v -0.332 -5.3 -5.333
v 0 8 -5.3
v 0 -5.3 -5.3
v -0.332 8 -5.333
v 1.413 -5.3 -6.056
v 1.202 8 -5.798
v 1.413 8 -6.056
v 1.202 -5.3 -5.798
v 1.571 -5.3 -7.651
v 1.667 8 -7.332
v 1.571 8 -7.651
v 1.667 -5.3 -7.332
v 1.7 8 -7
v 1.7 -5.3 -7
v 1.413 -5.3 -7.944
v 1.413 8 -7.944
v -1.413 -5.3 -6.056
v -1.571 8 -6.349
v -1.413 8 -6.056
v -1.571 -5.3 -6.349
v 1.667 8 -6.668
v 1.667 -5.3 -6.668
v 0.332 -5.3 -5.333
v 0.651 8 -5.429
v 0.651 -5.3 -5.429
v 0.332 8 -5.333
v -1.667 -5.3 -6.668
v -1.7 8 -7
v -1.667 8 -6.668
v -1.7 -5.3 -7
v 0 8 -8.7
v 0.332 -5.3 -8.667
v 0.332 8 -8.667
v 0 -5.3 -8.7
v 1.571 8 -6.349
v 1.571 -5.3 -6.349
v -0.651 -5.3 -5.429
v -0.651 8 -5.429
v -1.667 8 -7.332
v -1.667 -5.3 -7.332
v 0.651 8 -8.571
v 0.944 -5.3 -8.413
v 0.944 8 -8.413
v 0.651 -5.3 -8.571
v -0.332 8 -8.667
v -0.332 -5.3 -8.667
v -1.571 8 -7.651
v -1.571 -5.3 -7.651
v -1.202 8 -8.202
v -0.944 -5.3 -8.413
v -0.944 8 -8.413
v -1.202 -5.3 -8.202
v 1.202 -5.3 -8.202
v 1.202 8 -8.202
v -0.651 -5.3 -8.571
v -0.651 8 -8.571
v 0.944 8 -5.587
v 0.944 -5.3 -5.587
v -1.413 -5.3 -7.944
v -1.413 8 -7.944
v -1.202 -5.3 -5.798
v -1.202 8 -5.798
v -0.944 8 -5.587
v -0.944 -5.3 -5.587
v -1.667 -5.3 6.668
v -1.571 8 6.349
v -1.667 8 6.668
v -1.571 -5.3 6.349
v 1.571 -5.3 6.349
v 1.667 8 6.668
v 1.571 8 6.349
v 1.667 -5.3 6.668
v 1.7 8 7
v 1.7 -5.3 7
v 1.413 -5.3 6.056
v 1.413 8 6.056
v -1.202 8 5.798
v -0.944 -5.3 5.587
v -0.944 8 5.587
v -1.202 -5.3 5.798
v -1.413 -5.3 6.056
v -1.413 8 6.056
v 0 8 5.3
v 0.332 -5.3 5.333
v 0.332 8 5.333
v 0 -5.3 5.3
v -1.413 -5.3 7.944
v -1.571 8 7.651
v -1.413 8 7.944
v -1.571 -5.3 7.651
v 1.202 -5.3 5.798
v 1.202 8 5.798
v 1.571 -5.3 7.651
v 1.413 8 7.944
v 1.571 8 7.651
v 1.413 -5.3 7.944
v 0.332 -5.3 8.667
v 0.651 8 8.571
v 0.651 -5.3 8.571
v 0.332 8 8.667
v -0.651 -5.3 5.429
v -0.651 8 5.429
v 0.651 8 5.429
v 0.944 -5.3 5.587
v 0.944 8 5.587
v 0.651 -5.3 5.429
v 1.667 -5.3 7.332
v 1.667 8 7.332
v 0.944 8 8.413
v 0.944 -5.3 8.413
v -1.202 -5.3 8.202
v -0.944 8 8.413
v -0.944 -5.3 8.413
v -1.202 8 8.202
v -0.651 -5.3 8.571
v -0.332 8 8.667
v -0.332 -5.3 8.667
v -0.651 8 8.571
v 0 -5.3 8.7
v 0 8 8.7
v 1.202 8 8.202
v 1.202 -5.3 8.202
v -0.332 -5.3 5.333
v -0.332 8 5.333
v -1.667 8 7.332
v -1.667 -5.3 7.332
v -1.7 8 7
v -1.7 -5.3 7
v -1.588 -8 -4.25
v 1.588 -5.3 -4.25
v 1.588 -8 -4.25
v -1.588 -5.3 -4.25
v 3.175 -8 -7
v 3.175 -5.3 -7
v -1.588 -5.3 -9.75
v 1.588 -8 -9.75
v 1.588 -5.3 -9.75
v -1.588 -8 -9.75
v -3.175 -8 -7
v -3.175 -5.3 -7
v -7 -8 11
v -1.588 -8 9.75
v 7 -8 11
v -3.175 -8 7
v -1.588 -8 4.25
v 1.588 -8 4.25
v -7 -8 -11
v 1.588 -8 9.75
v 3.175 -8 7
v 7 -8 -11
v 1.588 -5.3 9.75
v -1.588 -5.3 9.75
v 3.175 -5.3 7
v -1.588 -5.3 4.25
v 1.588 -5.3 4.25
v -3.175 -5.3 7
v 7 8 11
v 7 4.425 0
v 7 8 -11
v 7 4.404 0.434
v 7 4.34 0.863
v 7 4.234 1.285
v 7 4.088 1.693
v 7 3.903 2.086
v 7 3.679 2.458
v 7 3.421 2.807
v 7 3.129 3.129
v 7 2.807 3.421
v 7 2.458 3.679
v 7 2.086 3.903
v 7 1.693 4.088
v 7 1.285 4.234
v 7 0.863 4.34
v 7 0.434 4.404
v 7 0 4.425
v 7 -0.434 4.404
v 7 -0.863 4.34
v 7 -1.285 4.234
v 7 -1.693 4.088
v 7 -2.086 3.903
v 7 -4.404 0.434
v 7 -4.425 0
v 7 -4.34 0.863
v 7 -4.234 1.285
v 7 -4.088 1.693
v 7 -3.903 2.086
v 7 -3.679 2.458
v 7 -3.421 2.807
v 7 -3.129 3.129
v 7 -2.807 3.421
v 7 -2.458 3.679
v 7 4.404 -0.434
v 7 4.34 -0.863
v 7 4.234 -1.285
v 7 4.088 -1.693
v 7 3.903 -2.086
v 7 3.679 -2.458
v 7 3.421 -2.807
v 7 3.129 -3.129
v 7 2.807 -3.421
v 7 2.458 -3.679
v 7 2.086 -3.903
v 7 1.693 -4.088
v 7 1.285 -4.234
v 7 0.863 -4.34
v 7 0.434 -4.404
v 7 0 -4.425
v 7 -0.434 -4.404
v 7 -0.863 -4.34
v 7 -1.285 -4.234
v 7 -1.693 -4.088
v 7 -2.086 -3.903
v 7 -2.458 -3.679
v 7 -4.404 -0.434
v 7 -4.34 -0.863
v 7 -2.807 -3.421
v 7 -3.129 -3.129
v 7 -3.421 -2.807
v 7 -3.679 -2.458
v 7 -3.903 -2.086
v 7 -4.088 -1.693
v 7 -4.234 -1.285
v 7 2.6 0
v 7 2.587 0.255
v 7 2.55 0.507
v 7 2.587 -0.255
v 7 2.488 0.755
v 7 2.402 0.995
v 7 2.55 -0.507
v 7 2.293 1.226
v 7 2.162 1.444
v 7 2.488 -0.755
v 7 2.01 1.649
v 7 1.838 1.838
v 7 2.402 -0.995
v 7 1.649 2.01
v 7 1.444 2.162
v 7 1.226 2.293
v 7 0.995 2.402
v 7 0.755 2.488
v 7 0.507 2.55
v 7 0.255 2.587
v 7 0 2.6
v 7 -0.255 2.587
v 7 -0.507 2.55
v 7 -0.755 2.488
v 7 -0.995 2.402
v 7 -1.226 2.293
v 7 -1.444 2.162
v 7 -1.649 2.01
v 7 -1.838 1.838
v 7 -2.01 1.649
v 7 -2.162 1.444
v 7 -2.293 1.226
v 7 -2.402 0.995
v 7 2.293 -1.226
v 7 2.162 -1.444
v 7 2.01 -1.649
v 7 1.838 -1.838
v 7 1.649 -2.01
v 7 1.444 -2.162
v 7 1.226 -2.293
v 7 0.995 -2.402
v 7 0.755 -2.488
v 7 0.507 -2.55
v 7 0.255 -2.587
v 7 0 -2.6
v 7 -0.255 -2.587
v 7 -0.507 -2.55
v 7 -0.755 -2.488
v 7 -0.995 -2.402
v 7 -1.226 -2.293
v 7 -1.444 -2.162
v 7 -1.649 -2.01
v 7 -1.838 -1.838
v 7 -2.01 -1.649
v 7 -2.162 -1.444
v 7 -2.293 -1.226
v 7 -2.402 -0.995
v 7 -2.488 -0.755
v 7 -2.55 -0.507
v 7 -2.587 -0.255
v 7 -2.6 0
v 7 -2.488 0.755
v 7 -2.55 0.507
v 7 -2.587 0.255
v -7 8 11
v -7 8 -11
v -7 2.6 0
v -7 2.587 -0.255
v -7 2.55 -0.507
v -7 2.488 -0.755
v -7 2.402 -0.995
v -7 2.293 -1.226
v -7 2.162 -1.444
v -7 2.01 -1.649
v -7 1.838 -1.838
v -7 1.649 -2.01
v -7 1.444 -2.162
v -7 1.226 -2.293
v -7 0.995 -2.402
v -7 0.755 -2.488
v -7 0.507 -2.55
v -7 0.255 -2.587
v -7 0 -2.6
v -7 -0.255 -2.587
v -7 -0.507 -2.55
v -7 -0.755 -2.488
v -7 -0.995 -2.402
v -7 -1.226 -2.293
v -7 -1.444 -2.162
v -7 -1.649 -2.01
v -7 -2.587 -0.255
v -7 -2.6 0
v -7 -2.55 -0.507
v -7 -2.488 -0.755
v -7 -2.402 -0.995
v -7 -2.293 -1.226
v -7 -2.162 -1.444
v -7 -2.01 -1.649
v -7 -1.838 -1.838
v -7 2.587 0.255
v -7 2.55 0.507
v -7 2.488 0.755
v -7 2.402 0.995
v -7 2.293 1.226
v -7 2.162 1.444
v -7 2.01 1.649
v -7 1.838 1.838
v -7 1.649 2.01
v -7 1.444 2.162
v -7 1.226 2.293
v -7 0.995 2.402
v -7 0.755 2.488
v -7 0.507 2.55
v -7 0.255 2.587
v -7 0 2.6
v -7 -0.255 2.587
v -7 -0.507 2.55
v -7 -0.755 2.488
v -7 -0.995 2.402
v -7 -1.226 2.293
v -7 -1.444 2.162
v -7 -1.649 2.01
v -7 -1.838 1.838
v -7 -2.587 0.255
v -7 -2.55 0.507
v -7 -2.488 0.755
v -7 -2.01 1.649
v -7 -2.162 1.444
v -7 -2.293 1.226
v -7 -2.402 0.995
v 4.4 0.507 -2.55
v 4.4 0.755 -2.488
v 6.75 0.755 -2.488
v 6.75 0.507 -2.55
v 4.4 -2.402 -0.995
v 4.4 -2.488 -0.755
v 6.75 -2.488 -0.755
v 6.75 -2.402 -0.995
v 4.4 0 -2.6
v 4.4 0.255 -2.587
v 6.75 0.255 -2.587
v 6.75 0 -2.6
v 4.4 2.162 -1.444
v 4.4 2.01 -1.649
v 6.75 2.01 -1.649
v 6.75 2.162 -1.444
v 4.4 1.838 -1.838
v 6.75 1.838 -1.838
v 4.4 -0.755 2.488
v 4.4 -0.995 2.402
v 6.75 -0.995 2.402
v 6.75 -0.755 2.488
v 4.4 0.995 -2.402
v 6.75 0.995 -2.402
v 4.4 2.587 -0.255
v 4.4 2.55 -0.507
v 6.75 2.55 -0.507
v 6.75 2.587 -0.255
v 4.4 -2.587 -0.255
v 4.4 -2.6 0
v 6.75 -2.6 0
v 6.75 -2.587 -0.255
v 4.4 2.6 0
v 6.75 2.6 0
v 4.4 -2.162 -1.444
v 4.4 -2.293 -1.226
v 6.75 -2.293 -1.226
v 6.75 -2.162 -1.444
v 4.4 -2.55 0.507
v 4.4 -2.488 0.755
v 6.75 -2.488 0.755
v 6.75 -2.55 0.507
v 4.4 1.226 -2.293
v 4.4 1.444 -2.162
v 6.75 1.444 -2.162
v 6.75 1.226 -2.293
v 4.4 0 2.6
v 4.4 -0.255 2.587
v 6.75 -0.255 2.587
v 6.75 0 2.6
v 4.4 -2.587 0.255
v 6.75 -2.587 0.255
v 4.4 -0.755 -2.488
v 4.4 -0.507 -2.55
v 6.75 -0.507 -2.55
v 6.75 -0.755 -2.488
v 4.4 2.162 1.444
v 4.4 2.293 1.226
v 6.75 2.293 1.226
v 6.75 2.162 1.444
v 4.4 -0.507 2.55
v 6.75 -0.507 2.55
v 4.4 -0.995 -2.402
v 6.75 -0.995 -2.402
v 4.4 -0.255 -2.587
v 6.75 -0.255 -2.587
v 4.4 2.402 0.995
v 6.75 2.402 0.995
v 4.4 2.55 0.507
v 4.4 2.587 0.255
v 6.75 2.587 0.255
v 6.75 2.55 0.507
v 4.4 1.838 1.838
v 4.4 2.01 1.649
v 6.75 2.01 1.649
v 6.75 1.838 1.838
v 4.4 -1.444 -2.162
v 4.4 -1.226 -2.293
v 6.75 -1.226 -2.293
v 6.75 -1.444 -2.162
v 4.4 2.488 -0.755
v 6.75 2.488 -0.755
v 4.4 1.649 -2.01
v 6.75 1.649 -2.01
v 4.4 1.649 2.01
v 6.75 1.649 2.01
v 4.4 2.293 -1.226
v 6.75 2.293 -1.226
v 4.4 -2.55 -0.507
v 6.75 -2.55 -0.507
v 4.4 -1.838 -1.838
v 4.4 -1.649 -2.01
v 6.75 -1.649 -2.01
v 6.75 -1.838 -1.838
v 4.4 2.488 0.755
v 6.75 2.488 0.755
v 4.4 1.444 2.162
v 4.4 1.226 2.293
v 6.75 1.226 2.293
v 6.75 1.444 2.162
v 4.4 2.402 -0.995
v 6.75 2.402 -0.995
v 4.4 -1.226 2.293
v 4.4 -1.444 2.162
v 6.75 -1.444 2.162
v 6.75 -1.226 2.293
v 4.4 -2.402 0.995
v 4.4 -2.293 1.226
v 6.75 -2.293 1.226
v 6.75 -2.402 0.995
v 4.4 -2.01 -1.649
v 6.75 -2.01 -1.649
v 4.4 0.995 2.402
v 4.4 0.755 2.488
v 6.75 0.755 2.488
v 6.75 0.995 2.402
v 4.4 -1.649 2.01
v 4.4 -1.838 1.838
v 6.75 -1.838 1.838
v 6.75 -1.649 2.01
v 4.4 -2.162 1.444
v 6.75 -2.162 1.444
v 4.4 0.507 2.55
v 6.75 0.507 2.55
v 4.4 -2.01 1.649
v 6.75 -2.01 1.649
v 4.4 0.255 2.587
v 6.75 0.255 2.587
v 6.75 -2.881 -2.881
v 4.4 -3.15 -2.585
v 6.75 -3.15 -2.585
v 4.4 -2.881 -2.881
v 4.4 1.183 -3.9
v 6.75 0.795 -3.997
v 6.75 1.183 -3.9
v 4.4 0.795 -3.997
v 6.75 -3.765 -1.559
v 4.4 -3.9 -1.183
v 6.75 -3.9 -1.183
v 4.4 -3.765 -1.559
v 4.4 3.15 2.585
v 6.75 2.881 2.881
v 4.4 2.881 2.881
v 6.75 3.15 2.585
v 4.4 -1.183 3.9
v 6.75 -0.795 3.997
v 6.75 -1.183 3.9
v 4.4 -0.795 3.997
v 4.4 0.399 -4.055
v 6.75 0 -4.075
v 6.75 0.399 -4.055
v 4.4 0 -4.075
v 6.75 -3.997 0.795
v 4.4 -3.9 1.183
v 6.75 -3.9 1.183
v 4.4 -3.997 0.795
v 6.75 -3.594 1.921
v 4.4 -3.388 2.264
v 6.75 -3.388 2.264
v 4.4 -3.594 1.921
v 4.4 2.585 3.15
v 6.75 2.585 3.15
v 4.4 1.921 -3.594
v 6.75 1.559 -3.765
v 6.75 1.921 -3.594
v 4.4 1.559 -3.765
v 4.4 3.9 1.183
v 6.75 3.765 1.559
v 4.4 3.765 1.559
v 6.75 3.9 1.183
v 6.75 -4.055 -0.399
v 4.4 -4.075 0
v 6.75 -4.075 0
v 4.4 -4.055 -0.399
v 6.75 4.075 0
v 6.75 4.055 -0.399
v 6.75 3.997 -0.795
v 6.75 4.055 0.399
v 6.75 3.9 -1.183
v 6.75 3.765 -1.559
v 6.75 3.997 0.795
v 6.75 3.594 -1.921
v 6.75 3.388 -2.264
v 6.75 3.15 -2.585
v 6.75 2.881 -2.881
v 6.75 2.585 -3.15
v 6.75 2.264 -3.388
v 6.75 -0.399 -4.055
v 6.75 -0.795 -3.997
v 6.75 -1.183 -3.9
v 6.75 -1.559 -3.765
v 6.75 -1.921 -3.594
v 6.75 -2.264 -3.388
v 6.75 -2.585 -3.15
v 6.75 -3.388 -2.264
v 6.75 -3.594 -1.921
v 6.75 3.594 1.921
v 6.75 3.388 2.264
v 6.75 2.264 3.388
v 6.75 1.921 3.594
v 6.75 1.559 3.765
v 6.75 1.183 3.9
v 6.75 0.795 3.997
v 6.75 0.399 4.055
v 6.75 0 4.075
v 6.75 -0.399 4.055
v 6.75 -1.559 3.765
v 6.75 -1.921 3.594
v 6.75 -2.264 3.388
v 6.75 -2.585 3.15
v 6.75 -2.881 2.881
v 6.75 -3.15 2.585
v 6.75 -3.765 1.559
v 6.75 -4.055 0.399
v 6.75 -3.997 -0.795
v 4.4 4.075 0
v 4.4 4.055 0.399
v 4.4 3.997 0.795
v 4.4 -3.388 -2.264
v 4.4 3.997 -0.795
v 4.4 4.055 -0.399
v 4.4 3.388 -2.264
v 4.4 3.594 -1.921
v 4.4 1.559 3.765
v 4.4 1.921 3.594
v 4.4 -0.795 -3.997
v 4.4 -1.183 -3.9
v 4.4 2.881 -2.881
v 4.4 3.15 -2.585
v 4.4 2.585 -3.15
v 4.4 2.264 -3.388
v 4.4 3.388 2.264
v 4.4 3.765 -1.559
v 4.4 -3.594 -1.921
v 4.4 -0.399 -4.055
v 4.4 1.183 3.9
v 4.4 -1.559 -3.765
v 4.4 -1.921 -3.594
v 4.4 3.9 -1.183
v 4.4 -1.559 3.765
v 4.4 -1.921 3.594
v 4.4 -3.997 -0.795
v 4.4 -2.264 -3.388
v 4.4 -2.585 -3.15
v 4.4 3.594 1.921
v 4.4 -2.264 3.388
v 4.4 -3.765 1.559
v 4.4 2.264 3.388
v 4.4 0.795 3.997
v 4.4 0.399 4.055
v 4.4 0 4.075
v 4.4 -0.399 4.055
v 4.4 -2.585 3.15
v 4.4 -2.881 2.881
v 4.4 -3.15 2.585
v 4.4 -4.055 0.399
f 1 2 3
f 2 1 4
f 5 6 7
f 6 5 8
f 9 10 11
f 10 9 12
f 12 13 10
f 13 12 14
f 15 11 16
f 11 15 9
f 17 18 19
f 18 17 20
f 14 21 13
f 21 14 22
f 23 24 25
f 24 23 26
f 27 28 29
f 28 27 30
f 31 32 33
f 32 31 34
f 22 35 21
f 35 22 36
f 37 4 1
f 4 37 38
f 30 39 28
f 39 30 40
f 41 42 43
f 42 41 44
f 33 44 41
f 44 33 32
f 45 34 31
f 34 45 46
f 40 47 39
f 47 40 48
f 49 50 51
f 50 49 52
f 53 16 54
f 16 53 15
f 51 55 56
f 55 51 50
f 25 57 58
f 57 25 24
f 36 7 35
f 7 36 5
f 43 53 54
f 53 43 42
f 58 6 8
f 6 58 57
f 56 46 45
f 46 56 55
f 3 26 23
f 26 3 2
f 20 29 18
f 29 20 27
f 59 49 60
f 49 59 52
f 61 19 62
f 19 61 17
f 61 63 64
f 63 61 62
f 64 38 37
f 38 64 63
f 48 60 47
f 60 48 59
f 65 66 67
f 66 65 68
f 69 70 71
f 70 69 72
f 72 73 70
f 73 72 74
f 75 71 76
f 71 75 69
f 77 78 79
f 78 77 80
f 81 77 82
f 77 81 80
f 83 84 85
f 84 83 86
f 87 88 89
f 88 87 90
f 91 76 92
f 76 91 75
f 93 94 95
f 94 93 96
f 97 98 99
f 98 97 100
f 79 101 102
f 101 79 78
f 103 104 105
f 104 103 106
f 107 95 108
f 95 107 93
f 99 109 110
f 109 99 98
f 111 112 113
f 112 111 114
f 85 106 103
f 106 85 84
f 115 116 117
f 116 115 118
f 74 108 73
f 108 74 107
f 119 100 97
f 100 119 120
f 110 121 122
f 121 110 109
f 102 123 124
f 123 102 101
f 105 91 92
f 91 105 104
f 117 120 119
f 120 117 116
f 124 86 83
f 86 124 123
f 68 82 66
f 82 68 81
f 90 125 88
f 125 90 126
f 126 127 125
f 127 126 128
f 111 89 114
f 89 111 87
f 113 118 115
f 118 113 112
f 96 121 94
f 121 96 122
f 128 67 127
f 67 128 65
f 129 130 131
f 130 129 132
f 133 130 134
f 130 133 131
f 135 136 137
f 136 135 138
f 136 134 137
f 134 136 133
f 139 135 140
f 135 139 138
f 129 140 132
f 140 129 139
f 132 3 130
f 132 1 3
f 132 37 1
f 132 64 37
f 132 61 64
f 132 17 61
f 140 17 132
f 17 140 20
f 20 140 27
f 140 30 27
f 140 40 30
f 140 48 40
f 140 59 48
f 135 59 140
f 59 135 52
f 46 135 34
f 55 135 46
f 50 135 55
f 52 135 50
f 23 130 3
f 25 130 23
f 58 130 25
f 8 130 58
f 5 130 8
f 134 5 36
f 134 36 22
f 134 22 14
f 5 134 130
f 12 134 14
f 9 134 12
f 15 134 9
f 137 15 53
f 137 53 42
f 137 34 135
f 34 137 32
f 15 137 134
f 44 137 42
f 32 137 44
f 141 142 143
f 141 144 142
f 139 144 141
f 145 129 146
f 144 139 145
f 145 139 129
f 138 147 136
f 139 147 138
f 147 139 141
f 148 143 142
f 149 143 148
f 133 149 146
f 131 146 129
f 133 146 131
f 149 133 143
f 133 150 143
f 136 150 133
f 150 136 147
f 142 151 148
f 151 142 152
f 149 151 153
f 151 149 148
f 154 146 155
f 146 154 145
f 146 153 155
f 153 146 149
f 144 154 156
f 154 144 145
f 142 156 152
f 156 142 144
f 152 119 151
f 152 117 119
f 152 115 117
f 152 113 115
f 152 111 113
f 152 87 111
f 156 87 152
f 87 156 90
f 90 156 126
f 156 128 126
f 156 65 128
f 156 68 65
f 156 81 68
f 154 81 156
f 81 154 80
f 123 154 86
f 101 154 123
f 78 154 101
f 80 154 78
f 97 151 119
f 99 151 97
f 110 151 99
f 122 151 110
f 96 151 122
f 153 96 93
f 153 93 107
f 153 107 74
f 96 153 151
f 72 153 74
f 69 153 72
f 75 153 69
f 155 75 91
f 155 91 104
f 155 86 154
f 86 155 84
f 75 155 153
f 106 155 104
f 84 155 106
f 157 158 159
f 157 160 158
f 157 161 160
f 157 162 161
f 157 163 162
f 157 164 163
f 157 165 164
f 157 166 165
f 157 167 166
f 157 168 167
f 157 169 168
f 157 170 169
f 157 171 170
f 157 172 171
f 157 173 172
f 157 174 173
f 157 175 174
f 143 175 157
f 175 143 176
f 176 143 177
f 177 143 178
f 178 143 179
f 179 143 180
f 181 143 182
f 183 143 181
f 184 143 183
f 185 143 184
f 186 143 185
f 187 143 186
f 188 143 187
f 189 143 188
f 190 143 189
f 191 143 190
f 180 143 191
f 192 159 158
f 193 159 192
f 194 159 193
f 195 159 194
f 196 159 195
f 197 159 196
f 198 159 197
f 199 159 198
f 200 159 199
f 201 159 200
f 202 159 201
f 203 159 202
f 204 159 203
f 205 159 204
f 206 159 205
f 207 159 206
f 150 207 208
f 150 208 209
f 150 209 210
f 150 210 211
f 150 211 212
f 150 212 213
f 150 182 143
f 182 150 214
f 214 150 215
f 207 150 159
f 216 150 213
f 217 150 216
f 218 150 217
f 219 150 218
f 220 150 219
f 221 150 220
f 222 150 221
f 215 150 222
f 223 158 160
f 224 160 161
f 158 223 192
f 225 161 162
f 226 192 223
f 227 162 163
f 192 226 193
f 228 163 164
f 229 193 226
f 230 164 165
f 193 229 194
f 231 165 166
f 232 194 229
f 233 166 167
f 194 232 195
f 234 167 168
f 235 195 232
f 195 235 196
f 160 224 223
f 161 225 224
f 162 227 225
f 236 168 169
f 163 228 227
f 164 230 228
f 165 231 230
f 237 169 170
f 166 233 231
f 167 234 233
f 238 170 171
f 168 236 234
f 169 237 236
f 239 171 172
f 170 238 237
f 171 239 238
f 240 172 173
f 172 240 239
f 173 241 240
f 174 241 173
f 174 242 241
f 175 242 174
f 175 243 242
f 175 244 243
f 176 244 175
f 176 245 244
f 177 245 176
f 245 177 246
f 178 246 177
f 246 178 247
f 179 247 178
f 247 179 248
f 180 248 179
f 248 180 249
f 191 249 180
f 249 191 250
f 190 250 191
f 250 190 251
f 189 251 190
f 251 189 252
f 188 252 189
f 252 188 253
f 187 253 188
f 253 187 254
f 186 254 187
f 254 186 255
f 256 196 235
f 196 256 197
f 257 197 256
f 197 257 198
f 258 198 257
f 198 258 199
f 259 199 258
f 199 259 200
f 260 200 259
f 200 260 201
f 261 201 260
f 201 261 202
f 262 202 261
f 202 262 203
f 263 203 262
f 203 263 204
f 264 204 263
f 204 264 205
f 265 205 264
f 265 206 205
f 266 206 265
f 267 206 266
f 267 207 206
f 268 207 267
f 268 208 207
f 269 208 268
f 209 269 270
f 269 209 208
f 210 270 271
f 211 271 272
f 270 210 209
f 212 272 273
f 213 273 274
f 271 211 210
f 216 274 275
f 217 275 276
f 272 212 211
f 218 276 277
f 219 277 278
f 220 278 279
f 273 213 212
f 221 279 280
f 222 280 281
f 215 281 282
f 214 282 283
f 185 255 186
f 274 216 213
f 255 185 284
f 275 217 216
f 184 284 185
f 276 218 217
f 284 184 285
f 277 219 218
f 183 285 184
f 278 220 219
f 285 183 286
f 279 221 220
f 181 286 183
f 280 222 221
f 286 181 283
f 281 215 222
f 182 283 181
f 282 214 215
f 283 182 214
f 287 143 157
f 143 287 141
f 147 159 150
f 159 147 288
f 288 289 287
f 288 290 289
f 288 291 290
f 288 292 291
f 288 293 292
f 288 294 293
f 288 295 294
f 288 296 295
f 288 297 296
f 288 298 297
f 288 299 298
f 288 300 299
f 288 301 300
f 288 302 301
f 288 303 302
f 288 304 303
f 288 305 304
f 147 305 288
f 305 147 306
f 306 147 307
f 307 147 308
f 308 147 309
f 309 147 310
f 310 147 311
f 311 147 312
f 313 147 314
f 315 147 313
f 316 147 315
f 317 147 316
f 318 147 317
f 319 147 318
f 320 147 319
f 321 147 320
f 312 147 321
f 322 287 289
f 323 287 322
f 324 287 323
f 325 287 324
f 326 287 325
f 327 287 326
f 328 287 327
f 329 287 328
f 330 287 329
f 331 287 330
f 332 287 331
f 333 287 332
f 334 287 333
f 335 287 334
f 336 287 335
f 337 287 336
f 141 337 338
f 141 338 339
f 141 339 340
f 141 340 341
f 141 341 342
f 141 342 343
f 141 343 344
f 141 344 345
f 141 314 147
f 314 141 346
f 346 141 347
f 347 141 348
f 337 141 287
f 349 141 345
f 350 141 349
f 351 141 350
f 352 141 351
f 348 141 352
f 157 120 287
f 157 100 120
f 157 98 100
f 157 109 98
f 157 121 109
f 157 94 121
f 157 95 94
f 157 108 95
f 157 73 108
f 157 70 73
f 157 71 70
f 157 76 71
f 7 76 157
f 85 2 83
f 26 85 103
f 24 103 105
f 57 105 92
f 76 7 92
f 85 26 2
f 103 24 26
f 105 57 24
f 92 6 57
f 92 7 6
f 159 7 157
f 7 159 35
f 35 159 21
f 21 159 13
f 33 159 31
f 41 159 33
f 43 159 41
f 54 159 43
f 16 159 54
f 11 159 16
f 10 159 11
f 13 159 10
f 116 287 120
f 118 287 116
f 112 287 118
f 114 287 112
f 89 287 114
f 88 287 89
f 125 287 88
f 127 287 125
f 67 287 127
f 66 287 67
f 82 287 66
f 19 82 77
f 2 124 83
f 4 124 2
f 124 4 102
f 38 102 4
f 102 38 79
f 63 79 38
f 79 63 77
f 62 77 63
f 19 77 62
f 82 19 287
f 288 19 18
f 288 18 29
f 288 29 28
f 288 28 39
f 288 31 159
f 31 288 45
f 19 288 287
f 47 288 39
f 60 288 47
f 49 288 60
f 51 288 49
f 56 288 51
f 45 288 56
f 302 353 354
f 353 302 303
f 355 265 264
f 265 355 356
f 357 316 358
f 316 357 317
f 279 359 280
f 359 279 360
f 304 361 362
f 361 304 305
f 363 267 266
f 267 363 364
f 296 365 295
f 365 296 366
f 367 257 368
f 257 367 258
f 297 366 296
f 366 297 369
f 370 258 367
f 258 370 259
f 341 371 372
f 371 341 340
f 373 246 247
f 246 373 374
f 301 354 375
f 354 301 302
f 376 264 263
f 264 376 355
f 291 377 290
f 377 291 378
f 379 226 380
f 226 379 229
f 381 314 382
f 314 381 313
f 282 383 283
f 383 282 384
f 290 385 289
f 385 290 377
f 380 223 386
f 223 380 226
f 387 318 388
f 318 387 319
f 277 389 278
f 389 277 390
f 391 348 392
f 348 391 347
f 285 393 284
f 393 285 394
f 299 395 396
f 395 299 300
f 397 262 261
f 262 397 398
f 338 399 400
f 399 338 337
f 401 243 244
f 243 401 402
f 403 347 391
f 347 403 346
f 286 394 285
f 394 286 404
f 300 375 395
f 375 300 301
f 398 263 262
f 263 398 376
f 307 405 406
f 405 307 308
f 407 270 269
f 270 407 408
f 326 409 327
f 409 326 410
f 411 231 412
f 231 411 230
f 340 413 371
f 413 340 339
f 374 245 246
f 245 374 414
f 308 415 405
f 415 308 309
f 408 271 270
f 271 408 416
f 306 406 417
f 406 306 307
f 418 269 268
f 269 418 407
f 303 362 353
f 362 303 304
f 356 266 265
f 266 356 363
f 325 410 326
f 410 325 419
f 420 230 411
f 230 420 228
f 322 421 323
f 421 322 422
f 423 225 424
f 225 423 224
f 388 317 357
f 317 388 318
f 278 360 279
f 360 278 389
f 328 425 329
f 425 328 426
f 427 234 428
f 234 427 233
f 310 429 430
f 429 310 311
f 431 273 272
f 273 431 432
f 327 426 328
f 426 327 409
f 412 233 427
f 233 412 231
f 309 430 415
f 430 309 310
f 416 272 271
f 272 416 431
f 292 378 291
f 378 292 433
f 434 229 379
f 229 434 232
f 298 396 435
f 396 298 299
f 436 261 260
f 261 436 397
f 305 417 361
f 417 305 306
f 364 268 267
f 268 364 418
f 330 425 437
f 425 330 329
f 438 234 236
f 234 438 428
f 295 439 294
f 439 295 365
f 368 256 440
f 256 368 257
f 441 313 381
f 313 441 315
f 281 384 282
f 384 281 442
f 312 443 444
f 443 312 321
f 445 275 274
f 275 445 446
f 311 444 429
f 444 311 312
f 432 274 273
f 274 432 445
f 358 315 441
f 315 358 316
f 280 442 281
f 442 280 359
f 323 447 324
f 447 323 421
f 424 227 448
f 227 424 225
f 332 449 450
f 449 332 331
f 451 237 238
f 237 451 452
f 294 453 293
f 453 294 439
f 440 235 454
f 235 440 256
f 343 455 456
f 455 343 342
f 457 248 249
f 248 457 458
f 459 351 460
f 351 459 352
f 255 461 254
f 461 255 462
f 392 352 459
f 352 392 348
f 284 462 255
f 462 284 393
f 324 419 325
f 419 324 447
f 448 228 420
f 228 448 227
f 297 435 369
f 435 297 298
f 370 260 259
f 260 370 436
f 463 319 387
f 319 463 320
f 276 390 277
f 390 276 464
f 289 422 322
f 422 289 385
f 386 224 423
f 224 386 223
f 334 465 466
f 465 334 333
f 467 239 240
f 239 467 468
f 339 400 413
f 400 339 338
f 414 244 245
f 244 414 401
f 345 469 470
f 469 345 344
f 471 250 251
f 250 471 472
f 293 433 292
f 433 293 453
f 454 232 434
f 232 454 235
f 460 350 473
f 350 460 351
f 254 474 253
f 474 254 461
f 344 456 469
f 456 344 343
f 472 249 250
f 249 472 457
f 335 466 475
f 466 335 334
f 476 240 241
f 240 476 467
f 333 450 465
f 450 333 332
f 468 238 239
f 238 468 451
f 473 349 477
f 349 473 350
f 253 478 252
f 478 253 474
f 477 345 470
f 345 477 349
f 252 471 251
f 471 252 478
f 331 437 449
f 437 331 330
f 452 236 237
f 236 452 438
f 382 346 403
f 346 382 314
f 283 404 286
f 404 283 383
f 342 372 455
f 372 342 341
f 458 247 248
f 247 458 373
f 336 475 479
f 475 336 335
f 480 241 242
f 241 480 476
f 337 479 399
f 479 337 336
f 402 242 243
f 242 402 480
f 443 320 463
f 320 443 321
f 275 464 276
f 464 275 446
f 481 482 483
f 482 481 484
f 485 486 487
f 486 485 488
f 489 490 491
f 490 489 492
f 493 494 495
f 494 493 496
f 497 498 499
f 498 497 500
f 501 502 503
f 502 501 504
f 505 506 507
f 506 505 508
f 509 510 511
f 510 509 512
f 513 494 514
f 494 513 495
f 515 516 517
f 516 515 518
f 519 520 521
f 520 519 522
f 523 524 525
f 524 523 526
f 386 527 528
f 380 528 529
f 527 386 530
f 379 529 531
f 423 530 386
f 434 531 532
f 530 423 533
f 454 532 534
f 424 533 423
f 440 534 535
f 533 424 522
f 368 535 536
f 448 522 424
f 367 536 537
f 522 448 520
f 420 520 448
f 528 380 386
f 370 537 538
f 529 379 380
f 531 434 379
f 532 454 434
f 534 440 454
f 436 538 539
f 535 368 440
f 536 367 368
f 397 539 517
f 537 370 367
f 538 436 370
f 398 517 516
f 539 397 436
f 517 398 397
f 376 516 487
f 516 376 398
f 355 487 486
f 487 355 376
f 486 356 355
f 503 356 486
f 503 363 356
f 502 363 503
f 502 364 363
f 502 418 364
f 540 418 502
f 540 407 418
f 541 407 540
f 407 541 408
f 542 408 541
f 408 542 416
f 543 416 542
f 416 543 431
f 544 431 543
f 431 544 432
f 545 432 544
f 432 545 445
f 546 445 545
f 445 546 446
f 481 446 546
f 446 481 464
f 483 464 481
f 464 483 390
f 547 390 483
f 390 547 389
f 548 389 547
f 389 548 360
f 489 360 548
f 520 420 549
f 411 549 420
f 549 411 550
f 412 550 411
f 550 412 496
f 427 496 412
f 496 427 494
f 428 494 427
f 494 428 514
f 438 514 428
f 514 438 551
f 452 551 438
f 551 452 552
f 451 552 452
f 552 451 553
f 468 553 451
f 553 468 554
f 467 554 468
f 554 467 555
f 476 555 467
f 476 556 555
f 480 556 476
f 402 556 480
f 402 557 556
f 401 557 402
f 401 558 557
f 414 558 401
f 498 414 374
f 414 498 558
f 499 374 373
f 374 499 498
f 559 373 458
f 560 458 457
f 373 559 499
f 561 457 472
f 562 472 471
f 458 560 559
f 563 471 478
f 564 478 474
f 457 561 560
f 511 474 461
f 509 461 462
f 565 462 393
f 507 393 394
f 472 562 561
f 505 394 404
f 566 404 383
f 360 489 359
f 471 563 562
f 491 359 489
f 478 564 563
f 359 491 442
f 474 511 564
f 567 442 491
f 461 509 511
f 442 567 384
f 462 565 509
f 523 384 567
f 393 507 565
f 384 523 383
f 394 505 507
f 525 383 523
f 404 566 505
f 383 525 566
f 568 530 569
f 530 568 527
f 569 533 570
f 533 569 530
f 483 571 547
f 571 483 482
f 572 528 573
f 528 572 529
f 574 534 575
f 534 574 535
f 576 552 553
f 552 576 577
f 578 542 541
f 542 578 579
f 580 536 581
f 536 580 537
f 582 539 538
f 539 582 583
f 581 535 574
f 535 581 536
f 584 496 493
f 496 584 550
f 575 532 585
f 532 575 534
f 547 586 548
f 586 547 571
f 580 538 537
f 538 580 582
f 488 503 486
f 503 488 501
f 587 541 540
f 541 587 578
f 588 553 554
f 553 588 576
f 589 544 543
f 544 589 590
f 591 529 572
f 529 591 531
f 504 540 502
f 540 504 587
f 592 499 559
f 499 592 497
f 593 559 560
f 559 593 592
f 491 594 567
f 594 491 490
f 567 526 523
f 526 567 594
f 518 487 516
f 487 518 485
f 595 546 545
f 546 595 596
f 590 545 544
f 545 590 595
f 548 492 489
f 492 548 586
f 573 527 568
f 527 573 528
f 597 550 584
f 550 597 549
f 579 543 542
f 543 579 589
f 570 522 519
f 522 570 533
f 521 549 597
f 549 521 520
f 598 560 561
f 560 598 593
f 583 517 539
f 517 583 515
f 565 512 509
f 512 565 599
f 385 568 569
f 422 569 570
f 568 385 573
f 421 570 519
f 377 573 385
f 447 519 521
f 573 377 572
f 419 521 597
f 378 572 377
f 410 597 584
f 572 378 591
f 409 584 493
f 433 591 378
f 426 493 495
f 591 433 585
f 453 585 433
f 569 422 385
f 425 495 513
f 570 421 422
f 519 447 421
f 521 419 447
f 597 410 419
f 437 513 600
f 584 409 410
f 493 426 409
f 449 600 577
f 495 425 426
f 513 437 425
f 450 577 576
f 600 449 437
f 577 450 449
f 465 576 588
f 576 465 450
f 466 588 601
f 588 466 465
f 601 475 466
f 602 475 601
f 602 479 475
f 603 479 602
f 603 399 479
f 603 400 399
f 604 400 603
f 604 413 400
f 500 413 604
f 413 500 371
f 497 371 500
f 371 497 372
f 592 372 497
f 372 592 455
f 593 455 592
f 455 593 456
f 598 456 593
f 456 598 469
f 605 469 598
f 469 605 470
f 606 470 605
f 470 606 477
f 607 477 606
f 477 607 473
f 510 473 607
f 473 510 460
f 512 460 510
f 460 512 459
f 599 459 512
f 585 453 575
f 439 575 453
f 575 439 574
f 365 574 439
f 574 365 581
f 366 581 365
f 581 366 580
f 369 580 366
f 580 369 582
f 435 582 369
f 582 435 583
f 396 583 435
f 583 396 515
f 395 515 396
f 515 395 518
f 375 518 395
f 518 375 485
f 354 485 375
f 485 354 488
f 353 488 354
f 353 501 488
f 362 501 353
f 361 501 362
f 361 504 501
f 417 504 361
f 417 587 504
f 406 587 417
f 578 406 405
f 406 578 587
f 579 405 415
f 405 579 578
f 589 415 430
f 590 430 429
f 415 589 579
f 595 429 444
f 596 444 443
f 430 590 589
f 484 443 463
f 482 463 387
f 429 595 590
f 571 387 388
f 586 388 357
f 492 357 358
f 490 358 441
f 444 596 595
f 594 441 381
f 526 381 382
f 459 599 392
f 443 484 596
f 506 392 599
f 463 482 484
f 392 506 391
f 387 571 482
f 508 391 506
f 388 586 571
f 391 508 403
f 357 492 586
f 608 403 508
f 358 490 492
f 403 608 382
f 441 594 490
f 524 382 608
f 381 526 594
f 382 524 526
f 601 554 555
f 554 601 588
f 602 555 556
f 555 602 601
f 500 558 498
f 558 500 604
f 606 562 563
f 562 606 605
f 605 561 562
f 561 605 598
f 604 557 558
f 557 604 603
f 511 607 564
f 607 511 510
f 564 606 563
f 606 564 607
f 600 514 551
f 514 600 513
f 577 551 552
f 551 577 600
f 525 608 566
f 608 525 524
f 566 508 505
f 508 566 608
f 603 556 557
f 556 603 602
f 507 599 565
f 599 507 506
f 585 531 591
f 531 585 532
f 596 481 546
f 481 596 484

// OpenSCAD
// bearing_block.scad
// Single-bearing support block for the 5mm driven shaft.
// Two blocks are needed per shaft, spaced ~38-50mm apart (set from frame layout).
// Each block holds one MR85ZZ bearing (5mm ID, 8mm OD, 2.5mm wide).
//
// Coordinate system (assembled):
//   X = shaft axis direction
//   Y = lateral (left-right, perpendicular to shaft)
//   Z = vertical (up)
//   Shaft center is at the block center (origin when centered).
//
// Bearing pocket opens at the +X face (outer shaft end).
// M3 mounting holes run through the Y faces for side-wall frame mounting.
// Two M3 bolts pass through the block from the outer frame wall,
// captured by M3 nuts on the inner face.
//
// Print orientation: shaft axis vertical (X axis = print Z) gives the
// best circularity for the bearing pocket. Alternatively print flat and
// verify pocket fit with coupon before committing.
//
// Hardware needed per block:
//   1x MR85ZZ bearing
//   2x M3 bolt + nut

include <rollers_params.scad>

module bearing_block(params = default_params()) {
  validate(params);

  bx = pget(params, "provisional_bearing_block_x_mm");   // shaft axis depth
  by = pget(params, "provisional_bearing_block_y_mm");   // lateral width
  bz = pget(params, "provisional_bearing_block_z_mm");   // vertical height

  pocket_d       = pget(params, "provisional_bearing_pocket_d");
  pocket_depth   = pget(params, "provisional_bearing_pocket_depth");
  pocket_chamfer = pget(params, "provisional_bearing_lead_chamfer");
  shaft_d        = pget(params, "provisional_axle_clear_d");
  m3_z_offset    = pget(params, "provisional_bearing_block_m3_z_offset");
  m3_d           = 3.4;
  m3_nut_flat    = 5.5;
  m3_nut_depth   = 2.6;

  straight_depth = pocket_depth - pocket_chamfer;

  // Block centered at origin in all axes
  difference() {
    translate([-bx/2, -by/2, -bz/2])
      cube([bx, by, bz]);

    // Shaft bore through full X depth
    rotate([0, 90, 0])
      translate([0, 0, -bx/2 - 0.1])
        cylinder(h = bx + 0.2, d = shaft_d, $fn = 64);

    // Bearing pocket at +X face: lead chamfer then straight bore
    // Chamfer: widens toward the +X face
    translate([bx/2, 0, 0])
      rotate([0, 90, 0])
        cylinder(h = pocket_chamfer + 0.1,
                 d1 = pocket_d + 2*pocket_chamfer,
                 d2 = pocket_d,
                 $fn = 64);
    // Straight pocket (inward from chamfer end)
    translate([bx/2 - pocket_depth, 0, 0])
      rotate([0, 90, 0])
        cylinder(h = straight_depth + 0.1, d = pocket_d, $fn = 64);

    // M3 mounting holes through Y faces (for side-wall mounting)
    for (zs = [-1, 1])
      translate([0, -by/2 - 0.1, zs * m3_z_offset])
        rotate([-90, 0, 0])
          cylinder(h = by + 0.2, d = m3_d, $fn = 32);

    // M3 nut trap at -Y face (inner frame wall side, accessible for nut insertion)
    for (zs = [-1, 1])
      translate([0, -by/2, zs * m3_z_offset])
        rotate([-90, 0, 0])
          cylinder(h = m3_nut_depth + 0.1, d = m3_nut_flat / cos(30), $fn = 6);
  }
}

build_target = is_undef(build_target) ? "model" : build_target;
params = is_undef(params) ? default_params() : params;

if (build_target == "model") {
  bearing_block(params);
} else if (build_target == "validate") {
  validate(params);
  cube([1, 1, 1]);
} else {
  bearing_block(params);
}
